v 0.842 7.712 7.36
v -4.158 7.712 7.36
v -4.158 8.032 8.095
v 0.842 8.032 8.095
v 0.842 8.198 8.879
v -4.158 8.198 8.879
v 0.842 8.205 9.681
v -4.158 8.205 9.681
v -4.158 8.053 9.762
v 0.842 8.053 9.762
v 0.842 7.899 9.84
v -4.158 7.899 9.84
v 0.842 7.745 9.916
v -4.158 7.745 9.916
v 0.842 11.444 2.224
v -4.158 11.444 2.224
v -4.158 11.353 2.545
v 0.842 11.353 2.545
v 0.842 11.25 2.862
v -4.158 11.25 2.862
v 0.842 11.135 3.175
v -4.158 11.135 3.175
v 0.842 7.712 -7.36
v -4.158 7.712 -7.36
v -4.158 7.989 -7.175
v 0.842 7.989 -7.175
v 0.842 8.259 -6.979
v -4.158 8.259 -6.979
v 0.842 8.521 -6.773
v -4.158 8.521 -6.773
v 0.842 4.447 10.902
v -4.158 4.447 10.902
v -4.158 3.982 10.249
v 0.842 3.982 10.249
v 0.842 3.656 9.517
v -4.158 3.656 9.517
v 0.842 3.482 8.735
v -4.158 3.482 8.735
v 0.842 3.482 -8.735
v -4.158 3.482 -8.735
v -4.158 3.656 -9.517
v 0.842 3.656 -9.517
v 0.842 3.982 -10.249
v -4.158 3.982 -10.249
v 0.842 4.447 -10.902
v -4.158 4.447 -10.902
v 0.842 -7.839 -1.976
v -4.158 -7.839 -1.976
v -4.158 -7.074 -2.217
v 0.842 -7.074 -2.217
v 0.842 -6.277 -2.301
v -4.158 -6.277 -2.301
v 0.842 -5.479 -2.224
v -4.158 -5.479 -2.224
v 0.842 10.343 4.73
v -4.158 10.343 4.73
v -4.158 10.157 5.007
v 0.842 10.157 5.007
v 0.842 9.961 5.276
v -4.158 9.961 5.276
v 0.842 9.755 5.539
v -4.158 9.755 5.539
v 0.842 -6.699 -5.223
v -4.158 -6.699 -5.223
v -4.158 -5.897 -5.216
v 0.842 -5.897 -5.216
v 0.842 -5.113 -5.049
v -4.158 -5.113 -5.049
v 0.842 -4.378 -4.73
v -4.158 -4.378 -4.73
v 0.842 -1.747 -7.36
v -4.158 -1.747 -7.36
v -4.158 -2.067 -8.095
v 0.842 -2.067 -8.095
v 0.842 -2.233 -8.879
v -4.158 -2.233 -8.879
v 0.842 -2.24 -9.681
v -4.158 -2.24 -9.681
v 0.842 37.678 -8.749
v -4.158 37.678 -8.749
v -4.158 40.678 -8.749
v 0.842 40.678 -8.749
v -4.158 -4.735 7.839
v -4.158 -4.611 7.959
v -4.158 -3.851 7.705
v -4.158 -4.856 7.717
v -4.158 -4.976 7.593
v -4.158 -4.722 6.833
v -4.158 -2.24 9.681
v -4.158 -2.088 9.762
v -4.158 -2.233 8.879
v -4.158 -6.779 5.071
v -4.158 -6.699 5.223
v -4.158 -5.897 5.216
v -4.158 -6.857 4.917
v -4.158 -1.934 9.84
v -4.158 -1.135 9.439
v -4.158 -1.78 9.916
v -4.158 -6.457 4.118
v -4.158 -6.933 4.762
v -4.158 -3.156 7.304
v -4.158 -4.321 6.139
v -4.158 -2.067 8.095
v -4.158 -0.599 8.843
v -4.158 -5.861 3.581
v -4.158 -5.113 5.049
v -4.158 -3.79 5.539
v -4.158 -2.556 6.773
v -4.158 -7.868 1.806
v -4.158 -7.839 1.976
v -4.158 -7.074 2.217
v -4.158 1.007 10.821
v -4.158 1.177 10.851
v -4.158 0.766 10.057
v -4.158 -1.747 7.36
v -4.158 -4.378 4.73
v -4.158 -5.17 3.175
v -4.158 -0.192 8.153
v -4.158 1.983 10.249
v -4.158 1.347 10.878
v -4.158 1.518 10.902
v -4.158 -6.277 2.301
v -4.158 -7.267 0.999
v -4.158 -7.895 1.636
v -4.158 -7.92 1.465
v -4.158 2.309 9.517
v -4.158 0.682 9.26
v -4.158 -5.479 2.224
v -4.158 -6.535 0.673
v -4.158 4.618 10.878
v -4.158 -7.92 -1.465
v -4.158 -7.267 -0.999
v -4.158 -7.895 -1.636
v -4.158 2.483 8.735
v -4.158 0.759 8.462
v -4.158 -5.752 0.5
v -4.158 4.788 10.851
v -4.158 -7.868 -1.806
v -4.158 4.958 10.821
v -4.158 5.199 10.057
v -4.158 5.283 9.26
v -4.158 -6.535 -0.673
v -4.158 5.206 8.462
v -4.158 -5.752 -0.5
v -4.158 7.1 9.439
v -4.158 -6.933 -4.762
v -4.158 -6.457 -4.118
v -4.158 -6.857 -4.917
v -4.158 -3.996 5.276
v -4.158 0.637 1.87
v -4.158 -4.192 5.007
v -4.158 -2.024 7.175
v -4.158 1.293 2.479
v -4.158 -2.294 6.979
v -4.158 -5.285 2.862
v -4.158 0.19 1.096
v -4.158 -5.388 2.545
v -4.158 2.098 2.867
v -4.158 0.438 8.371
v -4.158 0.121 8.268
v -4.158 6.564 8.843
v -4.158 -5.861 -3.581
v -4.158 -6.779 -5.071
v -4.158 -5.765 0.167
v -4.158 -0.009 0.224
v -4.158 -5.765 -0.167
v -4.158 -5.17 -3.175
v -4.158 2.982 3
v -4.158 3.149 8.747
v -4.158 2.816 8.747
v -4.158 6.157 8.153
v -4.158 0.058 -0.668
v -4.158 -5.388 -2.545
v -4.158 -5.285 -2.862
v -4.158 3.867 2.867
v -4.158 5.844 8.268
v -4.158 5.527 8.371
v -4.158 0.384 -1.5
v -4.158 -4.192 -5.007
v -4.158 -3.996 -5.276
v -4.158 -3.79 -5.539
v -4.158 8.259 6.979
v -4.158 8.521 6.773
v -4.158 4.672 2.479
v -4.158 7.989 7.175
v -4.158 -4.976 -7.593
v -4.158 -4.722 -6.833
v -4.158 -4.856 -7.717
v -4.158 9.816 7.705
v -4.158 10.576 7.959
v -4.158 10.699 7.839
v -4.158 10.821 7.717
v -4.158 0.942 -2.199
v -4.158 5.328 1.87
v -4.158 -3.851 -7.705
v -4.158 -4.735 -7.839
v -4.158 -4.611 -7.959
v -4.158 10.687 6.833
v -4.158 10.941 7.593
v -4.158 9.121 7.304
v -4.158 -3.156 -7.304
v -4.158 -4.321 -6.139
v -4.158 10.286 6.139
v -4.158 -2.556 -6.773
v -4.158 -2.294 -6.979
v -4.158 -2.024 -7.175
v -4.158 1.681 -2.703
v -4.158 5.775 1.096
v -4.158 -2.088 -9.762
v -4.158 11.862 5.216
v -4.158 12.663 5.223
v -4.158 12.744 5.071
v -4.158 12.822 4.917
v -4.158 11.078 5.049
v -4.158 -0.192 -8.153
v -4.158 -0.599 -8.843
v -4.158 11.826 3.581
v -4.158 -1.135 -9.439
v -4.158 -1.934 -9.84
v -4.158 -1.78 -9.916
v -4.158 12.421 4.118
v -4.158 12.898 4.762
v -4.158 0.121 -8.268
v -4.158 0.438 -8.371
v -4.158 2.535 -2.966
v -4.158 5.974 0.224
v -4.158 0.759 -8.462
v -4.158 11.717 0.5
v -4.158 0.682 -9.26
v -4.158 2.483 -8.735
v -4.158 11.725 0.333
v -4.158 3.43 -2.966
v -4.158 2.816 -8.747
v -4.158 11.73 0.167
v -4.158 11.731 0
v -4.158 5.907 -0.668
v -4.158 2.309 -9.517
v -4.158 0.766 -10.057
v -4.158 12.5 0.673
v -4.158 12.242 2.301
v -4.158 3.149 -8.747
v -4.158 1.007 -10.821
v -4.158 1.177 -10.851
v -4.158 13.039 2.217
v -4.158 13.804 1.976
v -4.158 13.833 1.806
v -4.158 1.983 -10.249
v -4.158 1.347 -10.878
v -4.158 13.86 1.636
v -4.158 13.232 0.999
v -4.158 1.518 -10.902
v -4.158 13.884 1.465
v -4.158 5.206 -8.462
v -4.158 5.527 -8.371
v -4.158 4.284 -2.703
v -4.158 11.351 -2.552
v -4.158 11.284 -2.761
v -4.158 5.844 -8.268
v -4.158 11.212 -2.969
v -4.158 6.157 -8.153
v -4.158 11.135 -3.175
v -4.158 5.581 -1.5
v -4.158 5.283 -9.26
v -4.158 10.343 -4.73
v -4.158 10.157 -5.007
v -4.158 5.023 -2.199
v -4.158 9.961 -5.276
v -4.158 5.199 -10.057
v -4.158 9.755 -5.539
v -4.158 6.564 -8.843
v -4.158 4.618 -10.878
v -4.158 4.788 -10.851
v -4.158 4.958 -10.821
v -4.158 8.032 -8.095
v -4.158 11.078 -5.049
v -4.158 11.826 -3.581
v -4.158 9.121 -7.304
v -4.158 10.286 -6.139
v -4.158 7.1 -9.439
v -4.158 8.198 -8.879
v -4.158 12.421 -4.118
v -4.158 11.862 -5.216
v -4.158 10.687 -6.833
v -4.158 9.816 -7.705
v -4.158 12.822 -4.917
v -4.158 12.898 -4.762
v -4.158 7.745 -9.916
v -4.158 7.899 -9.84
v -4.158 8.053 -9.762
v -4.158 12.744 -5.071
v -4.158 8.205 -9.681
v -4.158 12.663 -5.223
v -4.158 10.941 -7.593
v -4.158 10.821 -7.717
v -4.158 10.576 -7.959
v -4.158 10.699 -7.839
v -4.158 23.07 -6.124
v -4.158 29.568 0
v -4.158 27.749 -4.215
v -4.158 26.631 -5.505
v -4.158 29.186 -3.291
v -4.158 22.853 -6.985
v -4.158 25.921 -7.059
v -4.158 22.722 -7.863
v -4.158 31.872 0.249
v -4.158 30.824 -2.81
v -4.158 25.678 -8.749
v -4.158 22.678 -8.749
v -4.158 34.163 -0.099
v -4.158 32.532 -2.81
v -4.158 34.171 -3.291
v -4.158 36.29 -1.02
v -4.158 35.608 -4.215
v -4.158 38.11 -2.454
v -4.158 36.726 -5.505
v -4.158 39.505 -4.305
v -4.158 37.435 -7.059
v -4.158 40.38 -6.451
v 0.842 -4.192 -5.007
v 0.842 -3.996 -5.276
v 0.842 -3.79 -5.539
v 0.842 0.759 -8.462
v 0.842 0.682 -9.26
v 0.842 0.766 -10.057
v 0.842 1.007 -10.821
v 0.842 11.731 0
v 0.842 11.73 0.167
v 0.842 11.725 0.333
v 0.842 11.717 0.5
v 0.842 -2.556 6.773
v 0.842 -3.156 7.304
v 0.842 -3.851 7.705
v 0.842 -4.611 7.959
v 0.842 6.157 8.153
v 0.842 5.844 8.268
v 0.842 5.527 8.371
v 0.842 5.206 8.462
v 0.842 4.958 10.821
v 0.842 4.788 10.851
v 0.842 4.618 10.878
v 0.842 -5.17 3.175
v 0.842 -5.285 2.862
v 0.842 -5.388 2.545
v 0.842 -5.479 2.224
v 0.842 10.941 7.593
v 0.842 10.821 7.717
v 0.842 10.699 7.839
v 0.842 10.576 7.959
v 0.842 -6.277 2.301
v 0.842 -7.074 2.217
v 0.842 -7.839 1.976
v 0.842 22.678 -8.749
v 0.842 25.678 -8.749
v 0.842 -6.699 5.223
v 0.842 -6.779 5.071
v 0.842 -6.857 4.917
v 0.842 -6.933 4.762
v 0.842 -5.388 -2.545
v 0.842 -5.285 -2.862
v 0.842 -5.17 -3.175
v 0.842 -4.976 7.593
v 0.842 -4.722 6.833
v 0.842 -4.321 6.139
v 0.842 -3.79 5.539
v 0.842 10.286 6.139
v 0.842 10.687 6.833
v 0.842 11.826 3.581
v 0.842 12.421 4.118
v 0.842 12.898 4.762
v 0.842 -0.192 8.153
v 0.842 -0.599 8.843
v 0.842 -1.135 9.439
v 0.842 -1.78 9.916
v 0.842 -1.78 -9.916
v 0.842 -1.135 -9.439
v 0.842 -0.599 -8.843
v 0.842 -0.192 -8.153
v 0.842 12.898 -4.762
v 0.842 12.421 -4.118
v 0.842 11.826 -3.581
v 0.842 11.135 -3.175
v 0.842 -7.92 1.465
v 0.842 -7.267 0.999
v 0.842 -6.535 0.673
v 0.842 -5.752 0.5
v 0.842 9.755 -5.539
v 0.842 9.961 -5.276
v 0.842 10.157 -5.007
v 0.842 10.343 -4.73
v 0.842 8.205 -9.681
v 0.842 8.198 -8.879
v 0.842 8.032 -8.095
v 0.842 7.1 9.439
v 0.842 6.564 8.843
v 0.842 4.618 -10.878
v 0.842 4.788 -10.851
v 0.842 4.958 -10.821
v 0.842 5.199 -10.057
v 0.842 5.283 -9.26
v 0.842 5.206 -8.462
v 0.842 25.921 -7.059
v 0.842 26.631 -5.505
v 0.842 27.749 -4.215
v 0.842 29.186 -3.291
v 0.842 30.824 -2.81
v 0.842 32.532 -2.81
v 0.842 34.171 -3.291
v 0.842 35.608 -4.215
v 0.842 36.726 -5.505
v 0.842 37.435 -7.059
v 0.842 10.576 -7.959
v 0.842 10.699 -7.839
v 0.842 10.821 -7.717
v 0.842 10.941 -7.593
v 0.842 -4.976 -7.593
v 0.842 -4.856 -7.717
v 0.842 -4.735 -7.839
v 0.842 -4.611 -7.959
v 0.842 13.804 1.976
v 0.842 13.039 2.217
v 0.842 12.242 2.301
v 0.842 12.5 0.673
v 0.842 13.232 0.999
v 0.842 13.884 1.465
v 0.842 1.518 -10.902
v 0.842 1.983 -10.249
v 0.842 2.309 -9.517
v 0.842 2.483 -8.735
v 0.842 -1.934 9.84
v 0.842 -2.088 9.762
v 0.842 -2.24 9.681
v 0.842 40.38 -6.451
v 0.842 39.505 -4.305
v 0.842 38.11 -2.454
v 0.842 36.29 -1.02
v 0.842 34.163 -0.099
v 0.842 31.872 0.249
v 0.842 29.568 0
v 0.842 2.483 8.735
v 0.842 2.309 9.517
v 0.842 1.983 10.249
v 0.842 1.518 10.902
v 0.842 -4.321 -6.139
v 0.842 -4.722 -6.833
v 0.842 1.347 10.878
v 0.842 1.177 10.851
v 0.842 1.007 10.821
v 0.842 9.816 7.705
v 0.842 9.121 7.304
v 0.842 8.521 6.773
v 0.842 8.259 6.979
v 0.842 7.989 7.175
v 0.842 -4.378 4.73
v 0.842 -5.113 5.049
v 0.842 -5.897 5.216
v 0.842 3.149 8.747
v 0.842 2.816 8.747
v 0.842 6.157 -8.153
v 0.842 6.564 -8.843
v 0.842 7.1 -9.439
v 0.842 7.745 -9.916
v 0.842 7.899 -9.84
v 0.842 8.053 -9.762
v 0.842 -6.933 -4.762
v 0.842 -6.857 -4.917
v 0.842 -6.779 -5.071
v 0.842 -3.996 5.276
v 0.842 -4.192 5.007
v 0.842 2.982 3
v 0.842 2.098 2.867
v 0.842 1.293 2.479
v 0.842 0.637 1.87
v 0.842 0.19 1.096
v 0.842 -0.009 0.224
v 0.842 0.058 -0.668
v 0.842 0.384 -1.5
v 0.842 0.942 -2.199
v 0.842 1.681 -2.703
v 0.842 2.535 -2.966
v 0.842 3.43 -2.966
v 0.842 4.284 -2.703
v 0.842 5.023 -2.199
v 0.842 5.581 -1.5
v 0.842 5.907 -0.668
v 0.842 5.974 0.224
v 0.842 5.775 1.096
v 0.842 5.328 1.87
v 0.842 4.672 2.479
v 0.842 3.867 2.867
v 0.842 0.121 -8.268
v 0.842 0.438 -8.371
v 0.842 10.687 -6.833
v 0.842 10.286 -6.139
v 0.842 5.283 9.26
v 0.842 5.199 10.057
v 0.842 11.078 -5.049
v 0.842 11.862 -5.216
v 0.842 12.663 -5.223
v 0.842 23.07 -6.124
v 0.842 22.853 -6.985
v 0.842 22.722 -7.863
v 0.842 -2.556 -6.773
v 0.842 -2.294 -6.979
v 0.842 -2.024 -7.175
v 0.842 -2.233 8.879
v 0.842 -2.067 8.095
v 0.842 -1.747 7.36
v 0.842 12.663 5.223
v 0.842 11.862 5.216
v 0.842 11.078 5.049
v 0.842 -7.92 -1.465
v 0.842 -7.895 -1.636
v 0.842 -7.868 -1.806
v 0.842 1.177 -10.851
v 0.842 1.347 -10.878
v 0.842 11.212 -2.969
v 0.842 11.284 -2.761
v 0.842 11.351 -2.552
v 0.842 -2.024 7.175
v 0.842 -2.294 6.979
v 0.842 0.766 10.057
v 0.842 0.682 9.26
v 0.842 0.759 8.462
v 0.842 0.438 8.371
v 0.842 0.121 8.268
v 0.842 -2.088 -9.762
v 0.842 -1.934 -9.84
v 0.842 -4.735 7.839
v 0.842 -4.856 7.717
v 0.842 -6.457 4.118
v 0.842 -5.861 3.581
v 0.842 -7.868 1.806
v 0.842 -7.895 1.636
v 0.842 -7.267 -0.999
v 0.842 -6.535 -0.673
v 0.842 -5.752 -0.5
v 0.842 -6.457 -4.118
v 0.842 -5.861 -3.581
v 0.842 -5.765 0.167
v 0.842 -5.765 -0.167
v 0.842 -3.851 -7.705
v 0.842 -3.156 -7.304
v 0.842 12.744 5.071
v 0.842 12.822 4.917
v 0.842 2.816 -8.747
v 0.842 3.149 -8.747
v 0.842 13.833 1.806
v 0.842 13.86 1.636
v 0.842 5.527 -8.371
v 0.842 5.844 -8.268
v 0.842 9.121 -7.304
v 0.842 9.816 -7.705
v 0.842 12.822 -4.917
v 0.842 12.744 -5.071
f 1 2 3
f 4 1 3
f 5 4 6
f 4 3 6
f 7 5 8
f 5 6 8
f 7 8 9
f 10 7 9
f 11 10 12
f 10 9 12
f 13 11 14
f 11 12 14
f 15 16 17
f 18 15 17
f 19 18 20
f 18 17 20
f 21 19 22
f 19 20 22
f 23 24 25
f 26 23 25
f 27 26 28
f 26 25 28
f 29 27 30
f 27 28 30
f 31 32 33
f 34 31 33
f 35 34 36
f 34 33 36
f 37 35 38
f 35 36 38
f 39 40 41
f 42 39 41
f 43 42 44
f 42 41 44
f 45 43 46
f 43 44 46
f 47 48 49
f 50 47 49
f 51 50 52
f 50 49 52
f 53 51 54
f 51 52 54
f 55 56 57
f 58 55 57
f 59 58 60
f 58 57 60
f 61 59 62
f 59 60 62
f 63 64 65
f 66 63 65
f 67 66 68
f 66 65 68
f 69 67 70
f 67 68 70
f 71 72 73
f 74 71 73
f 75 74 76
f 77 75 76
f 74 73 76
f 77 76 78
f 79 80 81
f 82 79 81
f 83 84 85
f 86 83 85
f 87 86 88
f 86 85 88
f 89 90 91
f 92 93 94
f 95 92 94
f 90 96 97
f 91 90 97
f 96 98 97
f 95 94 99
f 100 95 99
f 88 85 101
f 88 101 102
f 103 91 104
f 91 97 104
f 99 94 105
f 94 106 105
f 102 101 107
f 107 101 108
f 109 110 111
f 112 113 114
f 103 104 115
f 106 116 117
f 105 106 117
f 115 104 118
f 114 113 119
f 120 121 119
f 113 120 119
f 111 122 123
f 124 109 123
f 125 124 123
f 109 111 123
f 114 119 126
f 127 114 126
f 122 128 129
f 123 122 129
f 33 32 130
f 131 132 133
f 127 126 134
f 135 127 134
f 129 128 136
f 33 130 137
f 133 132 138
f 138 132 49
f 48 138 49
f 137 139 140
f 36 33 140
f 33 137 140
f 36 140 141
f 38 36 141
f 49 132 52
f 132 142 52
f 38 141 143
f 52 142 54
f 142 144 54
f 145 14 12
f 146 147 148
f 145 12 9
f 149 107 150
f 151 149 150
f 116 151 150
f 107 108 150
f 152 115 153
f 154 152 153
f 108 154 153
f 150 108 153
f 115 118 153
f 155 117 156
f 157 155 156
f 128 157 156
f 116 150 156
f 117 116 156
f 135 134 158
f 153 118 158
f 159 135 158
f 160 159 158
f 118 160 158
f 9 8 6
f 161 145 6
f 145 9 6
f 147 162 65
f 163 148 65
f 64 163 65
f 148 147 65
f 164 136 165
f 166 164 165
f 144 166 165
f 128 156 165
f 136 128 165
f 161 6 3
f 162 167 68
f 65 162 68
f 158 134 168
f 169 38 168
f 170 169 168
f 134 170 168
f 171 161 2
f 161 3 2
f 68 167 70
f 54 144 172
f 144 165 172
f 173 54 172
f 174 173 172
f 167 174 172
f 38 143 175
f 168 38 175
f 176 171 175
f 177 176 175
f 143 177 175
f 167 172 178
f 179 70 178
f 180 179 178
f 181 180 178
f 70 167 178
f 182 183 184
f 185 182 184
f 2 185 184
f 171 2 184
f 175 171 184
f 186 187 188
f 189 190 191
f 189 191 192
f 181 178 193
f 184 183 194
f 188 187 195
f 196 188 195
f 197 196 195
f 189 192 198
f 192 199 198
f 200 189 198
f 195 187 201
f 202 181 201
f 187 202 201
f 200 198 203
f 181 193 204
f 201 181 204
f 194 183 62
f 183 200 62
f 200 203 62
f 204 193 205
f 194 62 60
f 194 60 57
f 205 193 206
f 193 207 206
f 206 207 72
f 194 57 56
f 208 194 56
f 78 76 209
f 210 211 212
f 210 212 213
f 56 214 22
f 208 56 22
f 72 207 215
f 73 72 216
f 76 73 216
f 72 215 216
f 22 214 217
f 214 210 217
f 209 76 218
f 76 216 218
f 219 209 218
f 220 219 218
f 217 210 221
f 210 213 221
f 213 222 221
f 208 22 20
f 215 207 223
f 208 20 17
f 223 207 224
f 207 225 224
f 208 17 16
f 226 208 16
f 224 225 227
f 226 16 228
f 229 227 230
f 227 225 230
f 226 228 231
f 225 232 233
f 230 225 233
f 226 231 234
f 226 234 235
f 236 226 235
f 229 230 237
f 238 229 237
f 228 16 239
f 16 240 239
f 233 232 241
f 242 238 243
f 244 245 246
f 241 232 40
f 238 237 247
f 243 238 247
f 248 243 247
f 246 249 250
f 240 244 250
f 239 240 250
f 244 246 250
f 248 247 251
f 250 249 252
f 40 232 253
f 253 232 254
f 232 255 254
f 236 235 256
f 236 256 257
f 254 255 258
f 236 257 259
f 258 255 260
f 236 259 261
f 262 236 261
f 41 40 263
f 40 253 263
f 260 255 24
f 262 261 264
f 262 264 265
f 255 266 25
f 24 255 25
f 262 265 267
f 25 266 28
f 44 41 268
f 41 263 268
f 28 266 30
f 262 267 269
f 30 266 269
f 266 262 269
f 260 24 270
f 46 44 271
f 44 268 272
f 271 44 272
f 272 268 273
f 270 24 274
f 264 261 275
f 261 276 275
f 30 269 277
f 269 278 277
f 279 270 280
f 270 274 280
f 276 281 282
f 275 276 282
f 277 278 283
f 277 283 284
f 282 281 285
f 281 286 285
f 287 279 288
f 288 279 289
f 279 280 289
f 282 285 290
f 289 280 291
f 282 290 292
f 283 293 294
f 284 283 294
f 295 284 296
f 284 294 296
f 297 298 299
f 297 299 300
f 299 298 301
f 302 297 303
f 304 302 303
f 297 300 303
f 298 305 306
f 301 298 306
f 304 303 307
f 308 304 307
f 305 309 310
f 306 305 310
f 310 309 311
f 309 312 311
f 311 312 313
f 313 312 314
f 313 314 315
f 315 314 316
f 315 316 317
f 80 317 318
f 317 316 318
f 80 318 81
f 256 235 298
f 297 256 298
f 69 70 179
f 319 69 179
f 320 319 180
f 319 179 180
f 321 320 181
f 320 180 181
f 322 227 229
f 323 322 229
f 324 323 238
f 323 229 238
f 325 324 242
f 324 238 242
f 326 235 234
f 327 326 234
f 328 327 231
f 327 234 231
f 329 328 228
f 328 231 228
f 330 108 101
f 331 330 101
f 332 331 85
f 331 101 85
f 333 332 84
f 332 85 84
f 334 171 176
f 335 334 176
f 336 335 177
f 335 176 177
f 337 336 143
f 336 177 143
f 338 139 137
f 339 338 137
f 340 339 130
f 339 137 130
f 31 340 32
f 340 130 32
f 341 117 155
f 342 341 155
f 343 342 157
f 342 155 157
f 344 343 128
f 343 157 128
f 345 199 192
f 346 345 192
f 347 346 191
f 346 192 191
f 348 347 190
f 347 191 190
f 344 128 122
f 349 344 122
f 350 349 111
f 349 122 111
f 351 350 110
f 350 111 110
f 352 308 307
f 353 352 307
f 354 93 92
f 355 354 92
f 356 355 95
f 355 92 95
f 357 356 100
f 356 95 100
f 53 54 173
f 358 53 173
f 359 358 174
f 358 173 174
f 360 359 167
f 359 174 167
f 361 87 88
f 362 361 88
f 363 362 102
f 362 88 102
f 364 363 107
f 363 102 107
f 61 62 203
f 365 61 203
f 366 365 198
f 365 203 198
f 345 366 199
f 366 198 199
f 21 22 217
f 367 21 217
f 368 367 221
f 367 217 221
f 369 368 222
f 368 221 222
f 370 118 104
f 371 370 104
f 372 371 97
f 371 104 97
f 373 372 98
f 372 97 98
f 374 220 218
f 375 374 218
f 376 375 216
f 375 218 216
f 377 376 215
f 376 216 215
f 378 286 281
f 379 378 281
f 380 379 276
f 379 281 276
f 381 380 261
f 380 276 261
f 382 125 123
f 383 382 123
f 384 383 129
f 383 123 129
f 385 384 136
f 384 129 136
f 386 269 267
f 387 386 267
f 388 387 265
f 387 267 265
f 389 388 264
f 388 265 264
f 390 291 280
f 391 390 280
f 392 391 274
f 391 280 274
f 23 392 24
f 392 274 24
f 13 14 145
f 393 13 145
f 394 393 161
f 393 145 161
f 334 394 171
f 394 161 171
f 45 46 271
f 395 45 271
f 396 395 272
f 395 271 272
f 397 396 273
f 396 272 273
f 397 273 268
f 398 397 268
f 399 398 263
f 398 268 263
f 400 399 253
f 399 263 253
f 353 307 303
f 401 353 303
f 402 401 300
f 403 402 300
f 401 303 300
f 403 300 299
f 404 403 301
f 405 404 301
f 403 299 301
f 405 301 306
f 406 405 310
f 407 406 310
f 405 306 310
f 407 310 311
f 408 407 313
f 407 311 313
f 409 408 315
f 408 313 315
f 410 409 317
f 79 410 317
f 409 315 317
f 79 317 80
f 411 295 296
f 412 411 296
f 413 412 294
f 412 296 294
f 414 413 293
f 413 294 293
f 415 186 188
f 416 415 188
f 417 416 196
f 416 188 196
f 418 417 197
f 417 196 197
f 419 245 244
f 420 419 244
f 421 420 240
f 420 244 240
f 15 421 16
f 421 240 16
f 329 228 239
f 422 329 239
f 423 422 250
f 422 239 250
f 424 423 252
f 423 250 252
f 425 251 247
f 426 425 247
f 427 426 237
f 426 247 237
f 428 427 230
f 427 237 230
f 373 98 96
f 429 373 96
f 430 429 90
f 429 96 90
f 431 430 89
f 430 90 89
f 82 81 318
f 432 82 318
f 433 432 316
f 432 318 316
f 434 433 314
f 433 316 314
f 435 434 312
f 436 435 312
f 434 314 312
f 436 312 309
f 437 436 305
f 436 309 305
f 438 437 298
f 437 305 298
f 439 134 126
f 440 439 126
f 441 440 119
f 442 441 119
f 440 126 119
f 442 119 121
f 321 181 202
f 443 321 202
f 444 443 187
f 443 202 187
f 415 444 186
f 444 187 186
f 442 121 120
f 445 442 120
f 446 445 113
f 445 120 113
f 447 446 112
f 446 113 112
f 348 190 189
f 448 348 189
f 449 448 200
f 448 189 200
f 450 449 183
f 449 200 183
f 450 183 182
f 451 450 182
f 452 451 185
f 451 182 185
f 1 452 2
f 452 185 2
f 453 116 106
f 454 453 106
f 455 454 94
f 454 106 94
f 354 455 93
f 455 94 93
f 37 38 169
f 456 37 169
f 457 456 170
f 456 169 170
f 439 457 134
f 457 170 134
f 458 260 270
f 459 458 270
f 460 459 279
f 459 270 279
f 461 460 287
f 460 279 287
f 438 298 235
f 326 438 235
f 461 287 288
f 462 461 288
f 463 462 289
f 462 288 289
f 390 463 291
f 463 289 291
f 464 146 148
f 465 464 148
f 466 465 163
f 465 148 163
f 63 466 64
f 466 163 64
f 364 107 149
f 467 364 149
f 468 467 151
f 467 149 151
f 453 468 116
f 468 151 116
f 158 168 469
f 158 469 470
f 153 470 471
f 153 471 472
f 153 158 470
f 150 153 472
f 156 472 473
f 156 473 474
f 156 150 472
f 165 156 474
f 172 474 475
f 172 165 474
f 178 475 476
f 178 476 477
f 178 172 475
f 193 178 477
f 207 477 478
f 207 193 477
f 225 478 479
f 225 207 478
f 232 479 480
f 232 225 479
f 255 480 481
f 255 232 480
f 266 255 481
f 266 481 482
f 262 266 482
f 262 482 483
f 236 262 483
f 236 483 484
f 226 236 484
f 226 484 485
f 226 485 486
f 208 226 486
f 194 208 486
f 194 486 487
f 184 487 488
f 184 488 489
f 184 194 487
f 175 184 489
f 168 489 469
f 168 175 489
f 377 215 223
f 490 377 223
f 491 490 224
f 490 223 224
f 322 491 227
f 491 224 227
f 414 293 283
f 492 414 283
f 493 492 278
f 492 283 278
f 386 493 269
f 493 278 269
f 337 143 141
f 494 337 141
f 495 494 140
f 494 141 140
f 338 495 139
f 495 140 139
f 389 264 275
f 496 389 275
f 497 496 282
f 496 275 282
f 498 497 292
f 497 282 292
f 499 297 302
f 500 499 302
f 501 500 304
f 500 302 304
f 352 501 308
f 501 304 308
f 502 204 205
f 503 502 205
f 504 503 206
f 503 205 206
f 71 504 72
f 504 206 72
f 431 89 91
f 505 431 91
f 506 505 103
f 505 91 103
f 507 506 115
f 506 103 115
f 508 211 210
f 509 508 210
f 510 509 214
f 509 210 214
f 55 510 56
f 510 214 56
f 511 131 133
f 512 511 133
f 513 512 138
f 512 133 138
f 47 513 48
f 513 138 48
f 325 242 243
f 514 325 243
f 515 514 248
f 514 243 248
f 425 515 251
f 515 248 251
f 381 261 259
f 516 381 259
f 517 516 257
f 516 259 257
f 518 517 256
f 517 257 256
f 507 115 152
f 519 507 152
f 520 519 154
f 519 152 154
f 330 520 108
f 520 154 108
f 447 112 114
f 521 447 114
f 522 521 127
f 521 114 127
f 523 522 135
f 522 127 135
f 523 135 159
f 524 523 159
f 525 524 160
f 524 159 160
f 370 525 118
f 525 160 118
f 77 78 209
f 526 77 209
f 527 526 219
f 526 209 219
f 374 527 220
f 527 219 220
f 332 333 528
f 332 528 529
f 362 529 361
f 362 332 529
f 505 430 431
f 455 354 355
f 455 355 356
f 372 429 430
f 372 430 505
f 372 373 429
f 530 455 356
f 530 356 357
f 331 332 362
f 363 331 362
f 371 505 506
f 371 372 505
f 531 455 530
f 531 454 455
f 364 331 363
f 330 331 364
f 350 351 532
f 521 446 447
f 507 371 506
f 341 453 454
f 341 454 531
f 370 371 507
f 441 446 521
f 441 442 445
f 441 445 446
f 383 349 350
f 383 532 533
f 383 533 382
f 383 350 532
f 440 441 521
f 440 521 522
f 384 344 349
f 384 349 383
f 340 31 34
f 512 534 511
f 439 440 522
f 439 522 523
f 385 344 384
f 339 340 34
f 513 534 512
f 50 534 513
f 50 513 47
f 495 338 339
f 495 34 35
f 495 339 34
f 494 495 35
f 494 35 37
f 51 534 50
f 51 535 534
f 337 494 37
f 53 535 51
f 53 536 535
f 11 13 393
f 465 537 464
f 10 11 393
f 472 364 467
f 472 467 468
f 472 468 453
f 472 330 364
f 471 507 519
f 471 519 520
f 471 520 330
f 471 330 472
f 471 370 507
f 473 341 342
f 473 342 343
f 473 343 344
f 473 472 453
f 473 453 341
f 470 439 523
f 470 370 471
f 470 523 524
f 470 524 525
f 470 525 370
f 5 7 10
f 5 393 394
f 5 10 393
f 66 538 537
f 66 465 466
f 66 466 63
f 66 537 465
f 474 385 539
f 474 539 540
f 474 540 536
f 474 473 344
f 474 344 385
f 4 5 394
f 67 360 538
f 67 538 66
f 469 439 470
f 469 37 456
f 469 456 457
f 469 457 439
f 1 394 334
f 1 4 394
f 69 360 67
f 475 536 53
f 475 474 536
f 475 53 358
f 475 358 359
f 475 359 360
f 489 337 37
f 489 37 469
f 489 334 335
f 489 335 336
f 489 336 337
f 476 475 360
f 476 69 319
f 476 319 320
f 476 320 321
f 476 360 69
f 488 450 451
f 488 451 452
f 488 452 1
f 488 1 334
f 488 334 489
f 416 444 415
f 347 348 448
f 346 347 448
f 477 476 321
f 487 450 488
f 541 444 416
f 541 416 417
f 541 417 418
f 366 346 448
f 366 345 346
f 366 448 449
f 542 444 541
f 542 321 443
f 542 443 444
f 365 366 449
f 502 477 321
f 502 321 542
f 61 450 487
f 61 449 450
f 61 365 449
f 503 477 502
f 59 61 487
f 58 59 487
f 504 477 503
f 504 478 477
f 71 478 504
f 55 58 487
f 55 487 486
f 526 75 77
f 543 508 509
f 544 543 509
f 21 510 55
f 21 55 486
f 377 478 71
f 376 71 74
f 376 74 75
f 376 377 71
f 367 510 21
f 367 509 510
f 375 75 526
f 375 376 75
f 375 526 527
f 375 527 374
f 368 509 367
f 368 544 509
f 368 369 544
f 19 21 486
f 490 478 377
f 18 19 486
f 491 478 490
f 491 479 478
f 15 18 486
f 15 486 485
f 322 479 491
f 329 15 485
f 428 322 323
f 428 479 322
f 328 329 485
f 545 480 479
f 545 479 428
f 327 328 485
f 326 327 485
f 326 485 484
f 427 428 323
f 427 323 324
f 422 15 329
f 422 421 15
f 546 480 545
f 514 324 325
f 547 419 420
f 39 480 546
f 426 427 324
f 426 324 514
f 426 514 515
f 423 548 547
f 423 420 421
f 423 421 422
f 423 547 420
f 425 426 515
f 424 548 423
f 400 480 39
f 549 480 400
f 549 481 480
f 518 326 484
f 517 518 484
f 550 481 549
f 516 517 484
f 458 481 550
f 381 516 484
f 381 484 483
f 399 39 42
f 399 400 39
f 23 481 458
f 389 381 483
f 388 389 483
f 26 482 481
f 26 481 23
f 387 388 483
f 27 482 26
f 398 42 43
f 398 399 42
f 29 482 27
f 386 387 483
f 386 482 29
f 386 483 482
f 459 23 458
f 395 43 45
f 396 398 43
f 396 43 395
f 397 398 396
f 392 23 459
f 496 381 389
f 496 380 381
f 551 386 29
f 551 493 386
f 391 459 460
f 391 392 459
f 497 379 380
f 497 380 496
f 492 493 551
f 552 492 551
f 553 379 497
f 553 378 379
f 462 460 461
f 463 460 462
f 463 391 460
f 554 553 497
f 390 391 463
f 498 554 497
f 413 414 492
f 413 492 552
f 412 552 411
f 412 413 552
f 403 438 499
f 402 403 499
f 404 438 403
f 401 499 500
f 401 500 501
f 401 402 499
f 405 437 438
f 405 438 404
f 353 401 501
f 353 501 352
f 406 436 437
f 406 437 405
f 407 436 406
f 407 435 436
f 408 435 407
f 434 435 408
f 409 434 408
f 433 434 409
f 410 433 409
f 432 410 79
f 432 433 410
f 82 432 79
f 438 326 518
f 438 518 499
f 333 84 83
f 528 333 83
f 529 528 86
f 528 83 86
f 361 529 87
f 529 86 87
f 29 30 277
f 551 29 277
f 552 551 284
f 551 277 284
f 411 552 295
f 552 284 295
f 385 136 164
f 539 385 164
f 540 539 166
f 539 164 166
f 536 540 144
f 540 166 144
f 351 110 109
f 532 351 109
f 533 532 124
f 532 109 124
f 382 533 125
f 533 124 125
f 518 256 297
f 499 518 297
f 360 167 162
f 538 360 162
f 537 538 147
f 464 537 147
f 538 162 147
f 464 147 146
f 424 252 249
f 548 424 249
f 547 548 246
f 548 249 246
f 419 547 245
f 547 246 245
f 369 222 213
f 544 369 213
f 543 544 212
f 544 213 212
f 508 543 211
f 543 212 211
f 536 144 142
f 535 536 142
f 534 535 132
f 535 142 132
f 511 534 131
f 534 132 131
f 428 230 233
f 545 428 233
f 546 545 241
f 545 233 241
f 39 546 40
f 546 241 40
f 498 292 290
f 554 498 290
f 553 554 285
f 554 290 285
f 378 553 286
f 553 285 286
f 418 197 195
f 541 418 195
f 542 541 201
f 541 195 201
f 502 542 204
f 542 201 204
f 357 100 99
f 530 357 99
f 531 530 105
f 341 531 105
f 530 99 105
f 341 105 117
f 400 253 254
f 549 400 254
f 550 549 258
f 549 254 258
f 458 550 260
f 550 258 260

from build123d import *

# Parameters (mm, degrees)
SKETCH_2_R      = 3
EXTRUDE_2_DEPTH = 5


with BuildPart() as part:
    # ｽｹｯﾁ2 → ﾎﾞｽ - 押し出し2 (new body)
    with BuildSketch(Plane(origin=(-4.158413815, 0, 0), x_dir=(0, 0, -1), z_dir=(1, 0, 0))):
        with BuildLine():
            Line((8.749, 22.67838595), (8.749, 25.67838595))
            ThreePointArc((8.749, 25.67838595), (2.749, 31.67838595), (8.749, 37.67838595))
            Line((8.749, 37.67838595), (8.749, 40.67838595))
            ThreePointArc((8.749, 40.67838595), (1.678067187, 37.246321757), (0, 29.567699095))
            Line((0, 29.567699095), (0, 11.731480336))
            ThreePointArc((0, 11.731480336), (-0.250064167, 11.727905936), (-0.499924007, 11.717185654))
            ThreePointArc((-0.499924007, 11.717185654), (-0.818060825, 12.87403268), (-1.464956435, 13.884494033))
            ThreePointArc((-1.464956435, 13.884494033), (-1.720779115, 13.847052083), (-1.975651141, 13.803607938))
            ThreePointArc((-1.975651141, 13.803607938), (-2.278635697, 12.642700346), (-2.223716399, 11.444163761))
            ThreePointArc((-2.223716399, 11.444163761), (-2.703589684, 11.303273797), (-3.174628369, 11.135193732))
            ThreePointArc((-3.174628369, 11.135193732), (-3.834679853, 12.137110952), (-4.762163869, 12.898215069))
            ThreePointArc((-4.762163869, 12.898215069), (-4.993895497, 12.783552102), (-5.222868219, 12.663474478))
            ThreePointArc((-5.222868219, 12.663474478), (-5.15228348, 11.465758371), (-4.729683951, 10.342853338))
            ThreePointArc((-4.729683951, 10.342853338), (-5.142533172, 10.06057002), (-5.538577987, 9.75515742))
            ThreePointArc((-5.538577987, 9.75515742), (-6.4759337, 10.504070195), (-7.593217523, 10.941314902))
            ThreePointArc((-7.593217523, 10.941314902), (-7.778174593, 10.760654929), (-7.958834566, 10.57569786))
            ThreePointArc((-7.958834566, 10.57569786), (-7.521589858, 9.458414036), (-6.772677084, 8.521058323))
            ThreePointArc((-6.772677084, 8.521058323), (-7.078089684, 8.125013509), (-7.360373002, 7.712164287))
            ThreePointArc((-7.360373002, 7.712164287), (-8.483278035, 8.134763816), (-9.680994141, 8.205348555))
            ThreePointArc((-9.680994141, 8.205348555), (-9.801071766, 7.976375833), (-9.915734733, 7.744644205))
            ThreePointArc((-9.915734733, 7.744644205), (-9.154630615, 6.81716019), (-8.152713396, 6.157108705))
            ThreePointArc((-8.152713396, 6.157108705), (-8.320793461, 5.68607002), (-8.461683425, 5.206196735))
            ThreePointArc((-8.461683425, 5.206196735), (-9.66022001, 5.261116033), (-10.821127601, 4.958131478))
            ThreePointArc((-10.821127601, 4.958131478), (-10.864571747, 4.703259452), (-10.902013697, 4.447436771))
            ThreePointArc((-10.902013697, 4.447436771), (-9.891552344, 3.800541161), (-8.734705318, 3.482404344))
            ThreePointArc((-8.734705318, 3.482404344), (-8.749, 2.982480336), (-8.734705318, 2.482556329))
            ThreePointArc((-8.734705318, 2.482556329), (-9.891552344, 2.164419511), (-10.902013697, 1.517523901))
            ThreePointArc((-10.902013697, 1.517523901), (-10.864571747, 1.261701221), (-10.821127601, 1.006829195))
            ThreePointArc((-10.821127601, 1.006829195), (-9.66022001, 0.70384464), (-8.461683425, 0.758763937))
            ThreePointArc((-8.461683425, 0.758763937), (-8.320793461, 0.278890652), (-8.152713396, -0.192148033))
            ThreePointArc((-8.152713396, -0.192148033), (-9.154630615, -0.852199517), (-9.915734733, -1.779683533))
            ThreePointArc((-9.915734733, -1.779683533), (-9.801071766, -2.011415161), (-9.680994141, -2.240387883))
            ThreePointArc((-9.680994141, -2.240387883), (-8.483278035, -2.169803144), (-7.360373002, -1.747203615))
            ThreePointArc((-7.360373002, -1.747203615), (-7.078089684, -2.160052836), (-6.772677084, -2.556097651))
            ThreePointArc((-6.772677084, -2.556097651), (-7.521589858, -3.493453364), (-7.958834566, -4.610737187))
            ThreePointArc((-7.958834566, -4.610737187), (-7.778174593, -4.795694257), (-7.593217523, -4.976354229))
            ThreePointArc((-7.593217523, -4.976354229), (-6.4759337, -4.539109522), (-5.538577987, -3.790196748))
            ThreePointArc((-5.538577987, -3.790196748), (-5.142533172, -4.095609348), (-4.729683951, -4.377892665))
            ThreePointArc((-4.729683951, -4.377892665), (-5.15228348, -5.500797699), (-5.222868219, -6.698513805))
            ThreePointArc((-5.222868219, -6.698513805), (-4.993895497, -6.81859143), (-4.762163869, -6.933254396))
            ThreePointArc((-4.762163869, -6.933254396), (-3.834679853, -6.172150279), (-3.174628369, -5.17023306))
            ThreePointArc((-3.174628369, -5.17023306), (-2.703589684, -5.338313125), (-2.223716399, -5.479203088))
            ThreePointArc((-2.223716399, -5.479203088), (-2.278635697, -6.677739674), (-1.975651141, -7.838647265))
            ThreePointArc((-1.975651141, -7.838647265), (-1.720779115, -7.88209141), (-1.464956435, -7.91953336))
            ThreePointArc((-1.464956435, -7.91953336), (-0.818060825, -6.909072007), (-0.499924007, -5.752224981))
            ThreePointArc((-0.499924007, -5.752224981), (0, -5.766519664), (0.499924007, -5.752224981))
            ThreePointArc((0.499924007, -5.752224981), (0.818060825, -6.909072007), (1.464956435, -7.91953336))
            ThreePointArc((1.464956435, -7.91953336), (1.720779115, -7.88209141), (1.975651141, -7.838647265))
            ThreePointArc((1.975651141, -7.838647265), (2.278635697, -6.677739674), (2.223716399, -5.479203088))
            ThreePointArc((2.223716399, -5.479203088), (2.703589684, -5.338313125), (3.174628369, -5.17023306))
            ThreePointArc((3.174628369, -5.17023306), (3.834679853, -6.172150279), (4.762163869, -6.933254396))
            ThreePointArc((4.762163869, -6.933254396), (4.993895497, -6.81859143), (5.222868219, -6.698513805))
            ThreePointArc((5.222868219, -6.698513805), (5.15228348, -5.500797699), (4.729683951, -4.377892665))
            ThreePointArc((4.729683951, -4.377892665), (5.142533172, -4.095609348), (5.538577987, -3.790196748))
            ThreePointArc((5.538577987, -3.790196748), (6.4759337, -4.539109522), (7.593217523, -4.976354229))
            ThreePointArc((7.593217523, -4.976354229), (7.778174593, -4.795694257), (7.958834566, -4.610737187))
            ThreePointArc((7.958834566, -4.610737187), (7.521589858, -3.493453364), (6.772677084, -2.556097651))
            ThreePointArc((6.772677084, -2.556097651), (7.078089684, -2.160052836), (7.360373002, -1.747203615))
            ThreePointArc((7.360373002, -1.747203615), (8.483278035, -2.169803144), (9.680994141, -2.240387883))
            ThreePointArc((9.680994141, -2.240387883), (9.801071766, -2.011415161), (9.915734733, -1.779683533))
            ThreePointArc((9.915734733, -1.779683533), (9.154630615, -0.852199517), (8.152713396, -0.192148033))
            ThreePointArc((8.152713396, -0.192148033), (8.320793461, 0.278890652), (8.461683425, 0.758763937))
            ThreePointArc((8.461683425, 0.758763937), (9.66022001, 0.70384464), (10.821127601, 1.006829195))
            ThreePointArc((10.821127601, 1.006829195), (10.864571747, 1.261701221), (10.902013697, 1.517523901))
            ThreePointArc((10.902013697, 1.517523901), (9.891552344, 2.164419511), (8.734705318, 2.482556329))
            ThreePointArc((8.734705318, 2.482556329), (8.749, 2.982480336), (8.734705318, 3.482404344))
            ThreePointArc((8.734705318, 3.482404344), (9.891552344, 3.800541161), (10.902013697, 4.447436771))
            ThreePointArc((10.902013697, 4.447436771), (10.864571747, 4.703259452), (10.821127601, 4.958131478))
            ThreePointArc((10.821127601, 4.958131478), (9.66022001, 5.261116033), (8.461683425, 5.206196735))
            ThreePointArc((8.461683425, 5.206196735), (8.320793461, 5.68607002), (8.152713396, 6.157108705))
            ThreePointArc((8.152713396, 6.157108705), (9.154630615, 6.81716019), (9.915734733, 7.744644205))
            ThreePointArc((9.915734733, 7.744644205), (9.801071766, 7.976375833), (9.680994141, 8.205348555))
            ThreePointArc((9.680994141, 8.205348555), (8.483278035, 8.134763816), (7.360373002, 7.712164287))
            ThreePointArc((7.360373002, 7.712164287), (7.078089684, 8.125013509), (6.772677084, 8.521058323))
            ThreePointArc((6.772677084, 8.521058323), (7.521589858, 9.458414036), (7.958834566, 10.57569786))
            ThreePointArc((7.958834566, 10.57569786), (7.778174593, 10.760654929), (7.593217523, 10.941314902))
            ThreePointArc((7.593217523, 10.941314902), (6.4759337, 10.504070195), (5.538577987, 9.75515742))
            ThreePointArc((5.538577987, 9.75515742), (5.142533172, 10.06057002), (4.729683951, 10.342853338))
            ThreePointArc((4.729683951, 10.342853338), (5.15228348, 11.465758371), (5.222868219, 12.663474478))
            ThreePointArc((5.222868219, 12.663474478), (4.993895497, 12.783552102), (4.762163869, 12.898215069))
            ThreePointArc((4.762163869, 12.898215069), (3.834679853, 12.137110952), (3.174628369, 11.135193732))
            ThreePointArc((3.174628369, 11.135193732), (2.865099875, 11.249051796), (2.551500033, 11.351162943))
            Line((2.551500033, 11.351162943), (6.1243, 23.069614266))
            ThreePointArc((6.1243, 23.069614266), (7.422151319, 22.776730341), (8.749, 22.67838595))
        make_face()
        with Locations(Location((0, 2.982480336, 0), (0, 0, 180))):
            Circle(SKETCH_2_R, mode=Mode.SUBTRACT)
    extrude(amount=EXTRUDE_2_DEPTH)


solid = part.part
